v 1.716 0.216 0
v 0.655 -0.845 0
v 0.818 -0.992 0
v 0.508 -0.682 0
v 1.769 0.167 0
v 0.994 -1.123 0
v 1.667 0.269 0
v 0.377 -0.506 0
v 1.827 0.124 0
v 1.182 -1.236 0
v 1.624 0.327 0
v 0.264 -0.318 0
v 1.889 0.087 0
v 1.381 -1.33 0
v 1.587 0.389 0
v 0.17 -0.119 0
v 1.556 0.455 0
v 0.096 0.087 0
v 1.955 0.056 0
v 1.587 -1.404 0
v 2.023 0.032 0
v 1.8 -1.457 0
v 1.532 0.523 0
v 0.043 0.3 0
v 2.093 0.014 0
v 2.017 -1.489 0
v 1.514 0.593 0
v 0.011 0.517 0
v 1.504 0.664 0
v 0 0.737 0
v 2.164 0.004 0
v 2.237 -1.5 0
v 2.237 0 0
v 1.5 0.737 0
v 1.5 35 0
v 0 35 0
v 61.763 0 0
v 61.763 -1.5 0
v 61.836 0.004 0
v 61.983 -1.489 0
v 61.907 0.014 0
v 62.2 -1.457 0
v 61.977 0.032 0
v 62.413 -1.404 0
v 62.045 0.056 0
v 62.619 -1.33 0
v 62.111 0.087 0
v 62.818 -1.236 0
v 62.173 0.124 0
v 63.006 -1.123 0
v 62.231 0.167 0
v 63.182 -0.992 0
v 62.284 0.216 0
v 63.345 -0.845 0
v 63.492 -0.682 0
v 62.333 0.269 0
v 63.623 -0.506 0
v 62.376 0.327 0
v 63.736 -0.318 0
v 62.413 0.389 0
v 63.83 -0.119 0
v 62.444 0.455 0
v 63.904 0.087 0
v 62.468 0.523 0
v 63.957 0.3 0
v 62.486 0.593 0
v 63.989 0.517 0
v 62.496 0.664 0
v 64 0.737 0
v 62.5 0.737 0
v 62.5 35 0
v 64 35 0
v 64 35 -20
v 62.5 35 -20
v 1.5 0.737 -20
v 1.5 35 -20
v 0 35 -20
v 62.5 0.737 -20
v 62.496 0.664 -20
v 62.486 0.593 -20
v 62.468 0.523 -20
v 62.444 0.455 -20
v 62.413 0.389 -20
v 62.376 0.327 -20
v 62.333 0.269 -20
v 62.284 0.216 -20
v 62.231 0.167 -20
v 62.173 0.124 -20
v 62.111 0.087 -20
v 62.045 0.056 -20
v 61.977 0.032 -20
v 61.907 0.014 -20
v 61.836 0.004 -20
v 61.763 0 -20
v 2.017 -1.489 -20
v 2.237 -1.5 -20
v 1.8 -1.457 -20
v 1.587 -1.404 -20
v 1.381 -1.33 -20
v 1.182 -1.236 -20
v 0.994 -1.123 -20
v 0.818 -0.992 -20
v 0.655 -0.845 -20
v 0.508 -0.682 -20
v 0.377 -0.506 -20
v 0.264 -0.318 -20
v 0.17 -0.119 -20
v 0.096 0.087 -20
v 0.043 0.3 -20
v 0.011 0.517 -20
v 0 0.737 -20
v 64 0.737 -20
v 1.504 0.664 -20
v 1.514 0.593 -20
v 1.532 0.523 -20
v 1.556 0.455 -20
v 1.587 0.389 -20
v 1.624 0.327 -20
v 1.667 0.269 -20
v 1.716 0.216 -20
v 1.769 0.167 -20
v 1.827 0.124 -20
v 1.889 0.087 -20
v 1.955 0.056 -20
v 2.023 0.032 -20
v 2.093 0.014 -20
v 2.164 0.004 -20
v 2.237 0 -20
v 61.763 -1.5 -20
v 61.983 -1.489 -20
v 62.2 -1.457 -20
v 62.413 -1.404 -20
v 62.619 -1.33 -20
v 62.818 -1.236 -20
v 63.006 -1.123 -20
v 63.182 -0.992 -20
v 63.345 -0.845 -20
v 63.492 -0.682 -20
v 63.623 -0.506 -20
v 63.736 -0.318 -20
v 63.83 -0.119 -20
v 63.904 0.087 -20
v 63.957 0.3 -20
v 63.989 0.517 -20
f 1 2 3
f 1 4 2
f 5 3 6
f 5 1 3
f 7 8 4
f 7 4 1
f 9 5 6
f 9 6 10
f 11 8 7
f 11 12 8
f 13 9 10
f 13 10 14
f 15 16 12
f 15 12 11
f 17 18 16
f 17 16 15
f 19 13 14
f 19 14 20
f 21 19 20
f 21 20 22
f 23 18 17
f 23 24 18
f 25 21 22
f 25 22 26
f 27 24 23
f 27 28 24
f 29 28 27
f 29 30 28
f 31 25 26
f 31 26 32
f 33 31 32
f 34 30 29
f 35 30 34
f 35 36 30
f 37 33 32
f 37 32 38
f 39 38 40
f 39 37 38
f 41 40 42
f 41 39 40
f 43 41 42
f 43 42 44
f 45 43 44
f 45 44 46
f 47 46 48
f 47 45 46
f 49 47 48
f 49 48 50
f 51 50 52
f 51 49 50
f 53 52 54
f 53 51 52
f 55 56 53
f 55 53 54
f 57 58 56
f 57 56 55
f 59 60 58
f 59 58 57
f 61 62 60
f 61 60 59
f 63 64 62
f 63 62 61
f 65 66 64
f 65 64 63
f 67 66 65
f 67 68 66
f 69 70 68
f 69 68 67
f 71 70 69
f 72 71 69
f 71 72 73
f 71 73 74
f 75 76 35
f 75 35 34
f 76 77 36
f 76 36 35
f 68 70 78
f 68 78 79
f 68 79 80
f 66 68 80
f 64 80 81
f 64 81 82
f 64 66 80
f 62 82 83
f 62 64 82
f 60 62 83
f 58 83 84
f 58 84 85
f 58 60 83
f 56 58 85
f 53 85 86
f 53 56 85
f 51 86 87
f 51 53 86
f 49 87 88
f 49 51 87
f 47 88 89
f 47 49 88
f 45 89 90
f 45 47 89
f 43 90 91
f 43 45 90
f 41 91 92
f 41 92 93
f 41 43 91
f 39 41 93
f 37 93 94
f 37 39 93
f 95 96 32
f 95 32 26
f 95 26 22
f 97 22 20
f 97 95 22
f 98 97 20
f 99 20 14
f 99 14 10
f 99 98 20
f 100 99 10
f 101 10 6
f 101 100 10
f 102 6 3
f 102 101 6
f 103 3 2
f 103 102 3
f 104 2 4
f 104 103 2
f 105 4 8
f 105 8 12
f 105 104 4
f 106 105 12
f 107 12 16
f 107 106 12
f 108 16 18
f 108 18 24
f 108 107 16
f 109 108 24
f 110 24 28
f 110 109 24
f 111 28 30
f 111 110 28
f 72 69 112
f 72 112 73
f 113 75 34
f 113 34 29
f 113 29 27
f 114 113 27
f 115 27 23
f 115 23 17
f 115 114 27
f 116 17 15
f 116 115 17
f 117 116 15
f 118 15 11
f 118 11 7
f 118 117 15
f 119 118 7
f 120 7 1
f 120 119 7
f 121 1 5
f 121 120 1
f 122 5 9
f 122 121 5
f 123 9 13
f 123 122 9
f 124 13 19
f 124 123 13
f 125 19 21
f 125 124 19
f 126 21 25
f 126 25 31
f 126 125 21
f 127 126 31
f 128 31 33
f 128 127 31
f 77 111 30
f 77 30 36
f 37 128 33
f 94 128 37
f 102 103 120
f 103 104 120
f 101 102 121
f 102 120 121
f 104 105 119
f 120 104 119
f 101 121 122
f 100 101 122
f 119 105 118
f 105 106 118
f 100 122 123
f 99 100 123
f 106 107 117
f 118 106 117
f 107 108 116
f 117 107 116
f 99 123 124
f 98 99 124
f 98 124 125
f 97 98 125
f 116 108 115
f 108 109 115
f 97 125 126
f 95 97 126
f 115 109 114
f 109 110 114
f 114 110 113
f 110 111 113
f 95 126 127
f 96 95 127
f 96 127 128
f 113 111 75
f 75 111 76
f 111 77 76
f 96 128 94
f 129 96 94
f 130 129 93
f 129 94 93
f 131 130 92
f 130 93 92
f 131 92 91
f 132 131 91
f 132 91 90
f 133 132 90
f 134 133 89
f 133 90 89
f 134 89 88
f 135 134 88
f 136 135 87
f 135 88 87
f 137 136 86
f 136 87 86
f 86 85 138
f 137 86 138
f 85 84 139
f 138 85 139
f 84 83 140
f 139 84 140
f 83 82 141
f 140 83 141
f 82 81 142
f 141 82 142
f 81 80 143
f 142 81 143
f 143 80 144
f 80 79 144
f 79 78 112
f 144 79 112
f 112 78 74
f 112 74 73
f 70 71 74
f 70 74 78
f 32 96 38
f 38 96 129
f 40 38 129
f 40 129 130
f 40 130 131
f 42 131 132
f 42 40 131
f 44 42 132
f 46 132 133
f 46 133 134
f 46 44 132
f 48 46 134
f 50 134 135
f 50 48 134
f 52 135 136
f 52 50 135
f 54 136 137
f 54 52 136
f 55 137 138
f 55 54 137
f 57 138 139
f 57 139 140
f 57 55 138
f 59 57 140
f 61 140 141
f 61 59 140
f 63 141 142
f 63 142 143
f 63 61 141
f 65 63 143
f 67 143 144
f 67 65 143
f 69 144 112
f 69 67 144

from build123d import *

# Parameters (mm, degrees)
SKETCH_1_W                       = 64
SKETCH_1_H                       = 20
SM_BASE_FLANGE_1_DEPTH           = 1.5
SM_EDGE_FLANGE_1_STRIP_W         = 7.4732
SM_EDGE_FLANGE_1_STRIP_H         = 1.5
SM_EDGE_FLANGE_1_STRIP_CUT_DEPTH = 20
SM_EDGE_FLANGE_1_DEPTH           = 20
SM_EDGE_FLANGE_2_STRIP_W         = 7.4732
SM_EDGE_FLANGE_2_STRIP_H         = 1.5
SM_EDGE_FLANGE_2_STRIP_CUT_DEPTH = 20
SM_EDGE_FLANGE_2_DEPTH           = 20


# Sheet-metal steps are written as plain solids
with BuildPart() as part:
    # Sketch 1 → Базовая кромка1 (new body)
    with BuildSketch(Plane(origin=(0, 0, 0), x_dir=(1, 0, 0), z_dir=(0, 1, 0))):
        with Locations((32, 10)):
            Rectangle(SKETCH_1_W, SKETCH_1_H)
    extrude(amount=-SM_BASE_FLANGE_1_DEPTH)

    # Ребро-кромка1 strip (across the edge) → Ребро-кромка1 strip cut (cut)
    with BuildSketch(Plane.XY.offset(-20)):
        with Locations((-1.5, -0.75)):
            Rectangle(SM_EDGE_FLANGE_1_STRIP_W, SM_EDGE_FLANGE_1_STRIP_H)
    extrude(amount=SM_EDGE_FLANGE_1_STRIP_CUT_DEPTH, mode=Mode.SUBTRACT)

    # Ребро-кромка1 section (across the edge) → Ребро-кромка1 (add)
    with BuildSketch(Plane.XY.offset(-20)):
        with BuildLine():
            Line((0, 0.7366), (0, 35))
            Line((0, 35), (1.5, 35))
            Line((1.5, 35), (1.5, 0.7366))
            ThreePointArc((1.5, 0.7366), (1.715745145, 0.215745145), (2.2366, 0))
            Line((2.2366, 0), (2.2366, -1.5))
            ThreePointArc((2.2366, -1.5), (0.655084973, -0.844915027), (0, 0.7366))
        make_face()
    extrude(amount=SM_EDGE_FLANGE_1_DEPTH)

    # Ребро-кромка2 strip (across the edge) → Ребро-кромка2 strip cut (cut)
    with BuildSketch(Plane(origin=(64, 0, 0), x_dir=(-1, 0, 0), z_dir=(0, 0, -1))):
        with Locations((-1.5, -0.75)):
            Rectangle(SM_EDGE_FLANGE_2_STRIP_W, SM_EDGE_FLANGE_2_STRIP_H)
    extrude(amount=SM_EDGE_FLANGE_2_STRIP_CUT_DEPTH, mode=Mode.SUBTRACT)

    # Ребро-кромка2 section (across the edge) → Ребро-кромка2 (add)
    with BuildSketch(Plane(origin=(64, 0, 0), x_dir=(-1, 0, 0), z_dir=(0, 0, -1))):
        with BuildLine():
            Line((0, 0.7366), (0, 35))
            Line((0, 35), (1.5, 35))
            Line((1.5, 35), (1.5, 0.7366))
            ThreePointArc((1.5, 0.7366), (1.715745145, 0.215745145), (2.2366, 0))
            Line((2.2366, 0), (2.2366, -1.5))
            ThreePointArc((2.2366, -1.5), (0.655084973, -0.844915027), (0, 0.7366))
        make_face()
    extrude(amount=SM_EDGE_FLANGE_2_DEPTH)


solid = part.part
